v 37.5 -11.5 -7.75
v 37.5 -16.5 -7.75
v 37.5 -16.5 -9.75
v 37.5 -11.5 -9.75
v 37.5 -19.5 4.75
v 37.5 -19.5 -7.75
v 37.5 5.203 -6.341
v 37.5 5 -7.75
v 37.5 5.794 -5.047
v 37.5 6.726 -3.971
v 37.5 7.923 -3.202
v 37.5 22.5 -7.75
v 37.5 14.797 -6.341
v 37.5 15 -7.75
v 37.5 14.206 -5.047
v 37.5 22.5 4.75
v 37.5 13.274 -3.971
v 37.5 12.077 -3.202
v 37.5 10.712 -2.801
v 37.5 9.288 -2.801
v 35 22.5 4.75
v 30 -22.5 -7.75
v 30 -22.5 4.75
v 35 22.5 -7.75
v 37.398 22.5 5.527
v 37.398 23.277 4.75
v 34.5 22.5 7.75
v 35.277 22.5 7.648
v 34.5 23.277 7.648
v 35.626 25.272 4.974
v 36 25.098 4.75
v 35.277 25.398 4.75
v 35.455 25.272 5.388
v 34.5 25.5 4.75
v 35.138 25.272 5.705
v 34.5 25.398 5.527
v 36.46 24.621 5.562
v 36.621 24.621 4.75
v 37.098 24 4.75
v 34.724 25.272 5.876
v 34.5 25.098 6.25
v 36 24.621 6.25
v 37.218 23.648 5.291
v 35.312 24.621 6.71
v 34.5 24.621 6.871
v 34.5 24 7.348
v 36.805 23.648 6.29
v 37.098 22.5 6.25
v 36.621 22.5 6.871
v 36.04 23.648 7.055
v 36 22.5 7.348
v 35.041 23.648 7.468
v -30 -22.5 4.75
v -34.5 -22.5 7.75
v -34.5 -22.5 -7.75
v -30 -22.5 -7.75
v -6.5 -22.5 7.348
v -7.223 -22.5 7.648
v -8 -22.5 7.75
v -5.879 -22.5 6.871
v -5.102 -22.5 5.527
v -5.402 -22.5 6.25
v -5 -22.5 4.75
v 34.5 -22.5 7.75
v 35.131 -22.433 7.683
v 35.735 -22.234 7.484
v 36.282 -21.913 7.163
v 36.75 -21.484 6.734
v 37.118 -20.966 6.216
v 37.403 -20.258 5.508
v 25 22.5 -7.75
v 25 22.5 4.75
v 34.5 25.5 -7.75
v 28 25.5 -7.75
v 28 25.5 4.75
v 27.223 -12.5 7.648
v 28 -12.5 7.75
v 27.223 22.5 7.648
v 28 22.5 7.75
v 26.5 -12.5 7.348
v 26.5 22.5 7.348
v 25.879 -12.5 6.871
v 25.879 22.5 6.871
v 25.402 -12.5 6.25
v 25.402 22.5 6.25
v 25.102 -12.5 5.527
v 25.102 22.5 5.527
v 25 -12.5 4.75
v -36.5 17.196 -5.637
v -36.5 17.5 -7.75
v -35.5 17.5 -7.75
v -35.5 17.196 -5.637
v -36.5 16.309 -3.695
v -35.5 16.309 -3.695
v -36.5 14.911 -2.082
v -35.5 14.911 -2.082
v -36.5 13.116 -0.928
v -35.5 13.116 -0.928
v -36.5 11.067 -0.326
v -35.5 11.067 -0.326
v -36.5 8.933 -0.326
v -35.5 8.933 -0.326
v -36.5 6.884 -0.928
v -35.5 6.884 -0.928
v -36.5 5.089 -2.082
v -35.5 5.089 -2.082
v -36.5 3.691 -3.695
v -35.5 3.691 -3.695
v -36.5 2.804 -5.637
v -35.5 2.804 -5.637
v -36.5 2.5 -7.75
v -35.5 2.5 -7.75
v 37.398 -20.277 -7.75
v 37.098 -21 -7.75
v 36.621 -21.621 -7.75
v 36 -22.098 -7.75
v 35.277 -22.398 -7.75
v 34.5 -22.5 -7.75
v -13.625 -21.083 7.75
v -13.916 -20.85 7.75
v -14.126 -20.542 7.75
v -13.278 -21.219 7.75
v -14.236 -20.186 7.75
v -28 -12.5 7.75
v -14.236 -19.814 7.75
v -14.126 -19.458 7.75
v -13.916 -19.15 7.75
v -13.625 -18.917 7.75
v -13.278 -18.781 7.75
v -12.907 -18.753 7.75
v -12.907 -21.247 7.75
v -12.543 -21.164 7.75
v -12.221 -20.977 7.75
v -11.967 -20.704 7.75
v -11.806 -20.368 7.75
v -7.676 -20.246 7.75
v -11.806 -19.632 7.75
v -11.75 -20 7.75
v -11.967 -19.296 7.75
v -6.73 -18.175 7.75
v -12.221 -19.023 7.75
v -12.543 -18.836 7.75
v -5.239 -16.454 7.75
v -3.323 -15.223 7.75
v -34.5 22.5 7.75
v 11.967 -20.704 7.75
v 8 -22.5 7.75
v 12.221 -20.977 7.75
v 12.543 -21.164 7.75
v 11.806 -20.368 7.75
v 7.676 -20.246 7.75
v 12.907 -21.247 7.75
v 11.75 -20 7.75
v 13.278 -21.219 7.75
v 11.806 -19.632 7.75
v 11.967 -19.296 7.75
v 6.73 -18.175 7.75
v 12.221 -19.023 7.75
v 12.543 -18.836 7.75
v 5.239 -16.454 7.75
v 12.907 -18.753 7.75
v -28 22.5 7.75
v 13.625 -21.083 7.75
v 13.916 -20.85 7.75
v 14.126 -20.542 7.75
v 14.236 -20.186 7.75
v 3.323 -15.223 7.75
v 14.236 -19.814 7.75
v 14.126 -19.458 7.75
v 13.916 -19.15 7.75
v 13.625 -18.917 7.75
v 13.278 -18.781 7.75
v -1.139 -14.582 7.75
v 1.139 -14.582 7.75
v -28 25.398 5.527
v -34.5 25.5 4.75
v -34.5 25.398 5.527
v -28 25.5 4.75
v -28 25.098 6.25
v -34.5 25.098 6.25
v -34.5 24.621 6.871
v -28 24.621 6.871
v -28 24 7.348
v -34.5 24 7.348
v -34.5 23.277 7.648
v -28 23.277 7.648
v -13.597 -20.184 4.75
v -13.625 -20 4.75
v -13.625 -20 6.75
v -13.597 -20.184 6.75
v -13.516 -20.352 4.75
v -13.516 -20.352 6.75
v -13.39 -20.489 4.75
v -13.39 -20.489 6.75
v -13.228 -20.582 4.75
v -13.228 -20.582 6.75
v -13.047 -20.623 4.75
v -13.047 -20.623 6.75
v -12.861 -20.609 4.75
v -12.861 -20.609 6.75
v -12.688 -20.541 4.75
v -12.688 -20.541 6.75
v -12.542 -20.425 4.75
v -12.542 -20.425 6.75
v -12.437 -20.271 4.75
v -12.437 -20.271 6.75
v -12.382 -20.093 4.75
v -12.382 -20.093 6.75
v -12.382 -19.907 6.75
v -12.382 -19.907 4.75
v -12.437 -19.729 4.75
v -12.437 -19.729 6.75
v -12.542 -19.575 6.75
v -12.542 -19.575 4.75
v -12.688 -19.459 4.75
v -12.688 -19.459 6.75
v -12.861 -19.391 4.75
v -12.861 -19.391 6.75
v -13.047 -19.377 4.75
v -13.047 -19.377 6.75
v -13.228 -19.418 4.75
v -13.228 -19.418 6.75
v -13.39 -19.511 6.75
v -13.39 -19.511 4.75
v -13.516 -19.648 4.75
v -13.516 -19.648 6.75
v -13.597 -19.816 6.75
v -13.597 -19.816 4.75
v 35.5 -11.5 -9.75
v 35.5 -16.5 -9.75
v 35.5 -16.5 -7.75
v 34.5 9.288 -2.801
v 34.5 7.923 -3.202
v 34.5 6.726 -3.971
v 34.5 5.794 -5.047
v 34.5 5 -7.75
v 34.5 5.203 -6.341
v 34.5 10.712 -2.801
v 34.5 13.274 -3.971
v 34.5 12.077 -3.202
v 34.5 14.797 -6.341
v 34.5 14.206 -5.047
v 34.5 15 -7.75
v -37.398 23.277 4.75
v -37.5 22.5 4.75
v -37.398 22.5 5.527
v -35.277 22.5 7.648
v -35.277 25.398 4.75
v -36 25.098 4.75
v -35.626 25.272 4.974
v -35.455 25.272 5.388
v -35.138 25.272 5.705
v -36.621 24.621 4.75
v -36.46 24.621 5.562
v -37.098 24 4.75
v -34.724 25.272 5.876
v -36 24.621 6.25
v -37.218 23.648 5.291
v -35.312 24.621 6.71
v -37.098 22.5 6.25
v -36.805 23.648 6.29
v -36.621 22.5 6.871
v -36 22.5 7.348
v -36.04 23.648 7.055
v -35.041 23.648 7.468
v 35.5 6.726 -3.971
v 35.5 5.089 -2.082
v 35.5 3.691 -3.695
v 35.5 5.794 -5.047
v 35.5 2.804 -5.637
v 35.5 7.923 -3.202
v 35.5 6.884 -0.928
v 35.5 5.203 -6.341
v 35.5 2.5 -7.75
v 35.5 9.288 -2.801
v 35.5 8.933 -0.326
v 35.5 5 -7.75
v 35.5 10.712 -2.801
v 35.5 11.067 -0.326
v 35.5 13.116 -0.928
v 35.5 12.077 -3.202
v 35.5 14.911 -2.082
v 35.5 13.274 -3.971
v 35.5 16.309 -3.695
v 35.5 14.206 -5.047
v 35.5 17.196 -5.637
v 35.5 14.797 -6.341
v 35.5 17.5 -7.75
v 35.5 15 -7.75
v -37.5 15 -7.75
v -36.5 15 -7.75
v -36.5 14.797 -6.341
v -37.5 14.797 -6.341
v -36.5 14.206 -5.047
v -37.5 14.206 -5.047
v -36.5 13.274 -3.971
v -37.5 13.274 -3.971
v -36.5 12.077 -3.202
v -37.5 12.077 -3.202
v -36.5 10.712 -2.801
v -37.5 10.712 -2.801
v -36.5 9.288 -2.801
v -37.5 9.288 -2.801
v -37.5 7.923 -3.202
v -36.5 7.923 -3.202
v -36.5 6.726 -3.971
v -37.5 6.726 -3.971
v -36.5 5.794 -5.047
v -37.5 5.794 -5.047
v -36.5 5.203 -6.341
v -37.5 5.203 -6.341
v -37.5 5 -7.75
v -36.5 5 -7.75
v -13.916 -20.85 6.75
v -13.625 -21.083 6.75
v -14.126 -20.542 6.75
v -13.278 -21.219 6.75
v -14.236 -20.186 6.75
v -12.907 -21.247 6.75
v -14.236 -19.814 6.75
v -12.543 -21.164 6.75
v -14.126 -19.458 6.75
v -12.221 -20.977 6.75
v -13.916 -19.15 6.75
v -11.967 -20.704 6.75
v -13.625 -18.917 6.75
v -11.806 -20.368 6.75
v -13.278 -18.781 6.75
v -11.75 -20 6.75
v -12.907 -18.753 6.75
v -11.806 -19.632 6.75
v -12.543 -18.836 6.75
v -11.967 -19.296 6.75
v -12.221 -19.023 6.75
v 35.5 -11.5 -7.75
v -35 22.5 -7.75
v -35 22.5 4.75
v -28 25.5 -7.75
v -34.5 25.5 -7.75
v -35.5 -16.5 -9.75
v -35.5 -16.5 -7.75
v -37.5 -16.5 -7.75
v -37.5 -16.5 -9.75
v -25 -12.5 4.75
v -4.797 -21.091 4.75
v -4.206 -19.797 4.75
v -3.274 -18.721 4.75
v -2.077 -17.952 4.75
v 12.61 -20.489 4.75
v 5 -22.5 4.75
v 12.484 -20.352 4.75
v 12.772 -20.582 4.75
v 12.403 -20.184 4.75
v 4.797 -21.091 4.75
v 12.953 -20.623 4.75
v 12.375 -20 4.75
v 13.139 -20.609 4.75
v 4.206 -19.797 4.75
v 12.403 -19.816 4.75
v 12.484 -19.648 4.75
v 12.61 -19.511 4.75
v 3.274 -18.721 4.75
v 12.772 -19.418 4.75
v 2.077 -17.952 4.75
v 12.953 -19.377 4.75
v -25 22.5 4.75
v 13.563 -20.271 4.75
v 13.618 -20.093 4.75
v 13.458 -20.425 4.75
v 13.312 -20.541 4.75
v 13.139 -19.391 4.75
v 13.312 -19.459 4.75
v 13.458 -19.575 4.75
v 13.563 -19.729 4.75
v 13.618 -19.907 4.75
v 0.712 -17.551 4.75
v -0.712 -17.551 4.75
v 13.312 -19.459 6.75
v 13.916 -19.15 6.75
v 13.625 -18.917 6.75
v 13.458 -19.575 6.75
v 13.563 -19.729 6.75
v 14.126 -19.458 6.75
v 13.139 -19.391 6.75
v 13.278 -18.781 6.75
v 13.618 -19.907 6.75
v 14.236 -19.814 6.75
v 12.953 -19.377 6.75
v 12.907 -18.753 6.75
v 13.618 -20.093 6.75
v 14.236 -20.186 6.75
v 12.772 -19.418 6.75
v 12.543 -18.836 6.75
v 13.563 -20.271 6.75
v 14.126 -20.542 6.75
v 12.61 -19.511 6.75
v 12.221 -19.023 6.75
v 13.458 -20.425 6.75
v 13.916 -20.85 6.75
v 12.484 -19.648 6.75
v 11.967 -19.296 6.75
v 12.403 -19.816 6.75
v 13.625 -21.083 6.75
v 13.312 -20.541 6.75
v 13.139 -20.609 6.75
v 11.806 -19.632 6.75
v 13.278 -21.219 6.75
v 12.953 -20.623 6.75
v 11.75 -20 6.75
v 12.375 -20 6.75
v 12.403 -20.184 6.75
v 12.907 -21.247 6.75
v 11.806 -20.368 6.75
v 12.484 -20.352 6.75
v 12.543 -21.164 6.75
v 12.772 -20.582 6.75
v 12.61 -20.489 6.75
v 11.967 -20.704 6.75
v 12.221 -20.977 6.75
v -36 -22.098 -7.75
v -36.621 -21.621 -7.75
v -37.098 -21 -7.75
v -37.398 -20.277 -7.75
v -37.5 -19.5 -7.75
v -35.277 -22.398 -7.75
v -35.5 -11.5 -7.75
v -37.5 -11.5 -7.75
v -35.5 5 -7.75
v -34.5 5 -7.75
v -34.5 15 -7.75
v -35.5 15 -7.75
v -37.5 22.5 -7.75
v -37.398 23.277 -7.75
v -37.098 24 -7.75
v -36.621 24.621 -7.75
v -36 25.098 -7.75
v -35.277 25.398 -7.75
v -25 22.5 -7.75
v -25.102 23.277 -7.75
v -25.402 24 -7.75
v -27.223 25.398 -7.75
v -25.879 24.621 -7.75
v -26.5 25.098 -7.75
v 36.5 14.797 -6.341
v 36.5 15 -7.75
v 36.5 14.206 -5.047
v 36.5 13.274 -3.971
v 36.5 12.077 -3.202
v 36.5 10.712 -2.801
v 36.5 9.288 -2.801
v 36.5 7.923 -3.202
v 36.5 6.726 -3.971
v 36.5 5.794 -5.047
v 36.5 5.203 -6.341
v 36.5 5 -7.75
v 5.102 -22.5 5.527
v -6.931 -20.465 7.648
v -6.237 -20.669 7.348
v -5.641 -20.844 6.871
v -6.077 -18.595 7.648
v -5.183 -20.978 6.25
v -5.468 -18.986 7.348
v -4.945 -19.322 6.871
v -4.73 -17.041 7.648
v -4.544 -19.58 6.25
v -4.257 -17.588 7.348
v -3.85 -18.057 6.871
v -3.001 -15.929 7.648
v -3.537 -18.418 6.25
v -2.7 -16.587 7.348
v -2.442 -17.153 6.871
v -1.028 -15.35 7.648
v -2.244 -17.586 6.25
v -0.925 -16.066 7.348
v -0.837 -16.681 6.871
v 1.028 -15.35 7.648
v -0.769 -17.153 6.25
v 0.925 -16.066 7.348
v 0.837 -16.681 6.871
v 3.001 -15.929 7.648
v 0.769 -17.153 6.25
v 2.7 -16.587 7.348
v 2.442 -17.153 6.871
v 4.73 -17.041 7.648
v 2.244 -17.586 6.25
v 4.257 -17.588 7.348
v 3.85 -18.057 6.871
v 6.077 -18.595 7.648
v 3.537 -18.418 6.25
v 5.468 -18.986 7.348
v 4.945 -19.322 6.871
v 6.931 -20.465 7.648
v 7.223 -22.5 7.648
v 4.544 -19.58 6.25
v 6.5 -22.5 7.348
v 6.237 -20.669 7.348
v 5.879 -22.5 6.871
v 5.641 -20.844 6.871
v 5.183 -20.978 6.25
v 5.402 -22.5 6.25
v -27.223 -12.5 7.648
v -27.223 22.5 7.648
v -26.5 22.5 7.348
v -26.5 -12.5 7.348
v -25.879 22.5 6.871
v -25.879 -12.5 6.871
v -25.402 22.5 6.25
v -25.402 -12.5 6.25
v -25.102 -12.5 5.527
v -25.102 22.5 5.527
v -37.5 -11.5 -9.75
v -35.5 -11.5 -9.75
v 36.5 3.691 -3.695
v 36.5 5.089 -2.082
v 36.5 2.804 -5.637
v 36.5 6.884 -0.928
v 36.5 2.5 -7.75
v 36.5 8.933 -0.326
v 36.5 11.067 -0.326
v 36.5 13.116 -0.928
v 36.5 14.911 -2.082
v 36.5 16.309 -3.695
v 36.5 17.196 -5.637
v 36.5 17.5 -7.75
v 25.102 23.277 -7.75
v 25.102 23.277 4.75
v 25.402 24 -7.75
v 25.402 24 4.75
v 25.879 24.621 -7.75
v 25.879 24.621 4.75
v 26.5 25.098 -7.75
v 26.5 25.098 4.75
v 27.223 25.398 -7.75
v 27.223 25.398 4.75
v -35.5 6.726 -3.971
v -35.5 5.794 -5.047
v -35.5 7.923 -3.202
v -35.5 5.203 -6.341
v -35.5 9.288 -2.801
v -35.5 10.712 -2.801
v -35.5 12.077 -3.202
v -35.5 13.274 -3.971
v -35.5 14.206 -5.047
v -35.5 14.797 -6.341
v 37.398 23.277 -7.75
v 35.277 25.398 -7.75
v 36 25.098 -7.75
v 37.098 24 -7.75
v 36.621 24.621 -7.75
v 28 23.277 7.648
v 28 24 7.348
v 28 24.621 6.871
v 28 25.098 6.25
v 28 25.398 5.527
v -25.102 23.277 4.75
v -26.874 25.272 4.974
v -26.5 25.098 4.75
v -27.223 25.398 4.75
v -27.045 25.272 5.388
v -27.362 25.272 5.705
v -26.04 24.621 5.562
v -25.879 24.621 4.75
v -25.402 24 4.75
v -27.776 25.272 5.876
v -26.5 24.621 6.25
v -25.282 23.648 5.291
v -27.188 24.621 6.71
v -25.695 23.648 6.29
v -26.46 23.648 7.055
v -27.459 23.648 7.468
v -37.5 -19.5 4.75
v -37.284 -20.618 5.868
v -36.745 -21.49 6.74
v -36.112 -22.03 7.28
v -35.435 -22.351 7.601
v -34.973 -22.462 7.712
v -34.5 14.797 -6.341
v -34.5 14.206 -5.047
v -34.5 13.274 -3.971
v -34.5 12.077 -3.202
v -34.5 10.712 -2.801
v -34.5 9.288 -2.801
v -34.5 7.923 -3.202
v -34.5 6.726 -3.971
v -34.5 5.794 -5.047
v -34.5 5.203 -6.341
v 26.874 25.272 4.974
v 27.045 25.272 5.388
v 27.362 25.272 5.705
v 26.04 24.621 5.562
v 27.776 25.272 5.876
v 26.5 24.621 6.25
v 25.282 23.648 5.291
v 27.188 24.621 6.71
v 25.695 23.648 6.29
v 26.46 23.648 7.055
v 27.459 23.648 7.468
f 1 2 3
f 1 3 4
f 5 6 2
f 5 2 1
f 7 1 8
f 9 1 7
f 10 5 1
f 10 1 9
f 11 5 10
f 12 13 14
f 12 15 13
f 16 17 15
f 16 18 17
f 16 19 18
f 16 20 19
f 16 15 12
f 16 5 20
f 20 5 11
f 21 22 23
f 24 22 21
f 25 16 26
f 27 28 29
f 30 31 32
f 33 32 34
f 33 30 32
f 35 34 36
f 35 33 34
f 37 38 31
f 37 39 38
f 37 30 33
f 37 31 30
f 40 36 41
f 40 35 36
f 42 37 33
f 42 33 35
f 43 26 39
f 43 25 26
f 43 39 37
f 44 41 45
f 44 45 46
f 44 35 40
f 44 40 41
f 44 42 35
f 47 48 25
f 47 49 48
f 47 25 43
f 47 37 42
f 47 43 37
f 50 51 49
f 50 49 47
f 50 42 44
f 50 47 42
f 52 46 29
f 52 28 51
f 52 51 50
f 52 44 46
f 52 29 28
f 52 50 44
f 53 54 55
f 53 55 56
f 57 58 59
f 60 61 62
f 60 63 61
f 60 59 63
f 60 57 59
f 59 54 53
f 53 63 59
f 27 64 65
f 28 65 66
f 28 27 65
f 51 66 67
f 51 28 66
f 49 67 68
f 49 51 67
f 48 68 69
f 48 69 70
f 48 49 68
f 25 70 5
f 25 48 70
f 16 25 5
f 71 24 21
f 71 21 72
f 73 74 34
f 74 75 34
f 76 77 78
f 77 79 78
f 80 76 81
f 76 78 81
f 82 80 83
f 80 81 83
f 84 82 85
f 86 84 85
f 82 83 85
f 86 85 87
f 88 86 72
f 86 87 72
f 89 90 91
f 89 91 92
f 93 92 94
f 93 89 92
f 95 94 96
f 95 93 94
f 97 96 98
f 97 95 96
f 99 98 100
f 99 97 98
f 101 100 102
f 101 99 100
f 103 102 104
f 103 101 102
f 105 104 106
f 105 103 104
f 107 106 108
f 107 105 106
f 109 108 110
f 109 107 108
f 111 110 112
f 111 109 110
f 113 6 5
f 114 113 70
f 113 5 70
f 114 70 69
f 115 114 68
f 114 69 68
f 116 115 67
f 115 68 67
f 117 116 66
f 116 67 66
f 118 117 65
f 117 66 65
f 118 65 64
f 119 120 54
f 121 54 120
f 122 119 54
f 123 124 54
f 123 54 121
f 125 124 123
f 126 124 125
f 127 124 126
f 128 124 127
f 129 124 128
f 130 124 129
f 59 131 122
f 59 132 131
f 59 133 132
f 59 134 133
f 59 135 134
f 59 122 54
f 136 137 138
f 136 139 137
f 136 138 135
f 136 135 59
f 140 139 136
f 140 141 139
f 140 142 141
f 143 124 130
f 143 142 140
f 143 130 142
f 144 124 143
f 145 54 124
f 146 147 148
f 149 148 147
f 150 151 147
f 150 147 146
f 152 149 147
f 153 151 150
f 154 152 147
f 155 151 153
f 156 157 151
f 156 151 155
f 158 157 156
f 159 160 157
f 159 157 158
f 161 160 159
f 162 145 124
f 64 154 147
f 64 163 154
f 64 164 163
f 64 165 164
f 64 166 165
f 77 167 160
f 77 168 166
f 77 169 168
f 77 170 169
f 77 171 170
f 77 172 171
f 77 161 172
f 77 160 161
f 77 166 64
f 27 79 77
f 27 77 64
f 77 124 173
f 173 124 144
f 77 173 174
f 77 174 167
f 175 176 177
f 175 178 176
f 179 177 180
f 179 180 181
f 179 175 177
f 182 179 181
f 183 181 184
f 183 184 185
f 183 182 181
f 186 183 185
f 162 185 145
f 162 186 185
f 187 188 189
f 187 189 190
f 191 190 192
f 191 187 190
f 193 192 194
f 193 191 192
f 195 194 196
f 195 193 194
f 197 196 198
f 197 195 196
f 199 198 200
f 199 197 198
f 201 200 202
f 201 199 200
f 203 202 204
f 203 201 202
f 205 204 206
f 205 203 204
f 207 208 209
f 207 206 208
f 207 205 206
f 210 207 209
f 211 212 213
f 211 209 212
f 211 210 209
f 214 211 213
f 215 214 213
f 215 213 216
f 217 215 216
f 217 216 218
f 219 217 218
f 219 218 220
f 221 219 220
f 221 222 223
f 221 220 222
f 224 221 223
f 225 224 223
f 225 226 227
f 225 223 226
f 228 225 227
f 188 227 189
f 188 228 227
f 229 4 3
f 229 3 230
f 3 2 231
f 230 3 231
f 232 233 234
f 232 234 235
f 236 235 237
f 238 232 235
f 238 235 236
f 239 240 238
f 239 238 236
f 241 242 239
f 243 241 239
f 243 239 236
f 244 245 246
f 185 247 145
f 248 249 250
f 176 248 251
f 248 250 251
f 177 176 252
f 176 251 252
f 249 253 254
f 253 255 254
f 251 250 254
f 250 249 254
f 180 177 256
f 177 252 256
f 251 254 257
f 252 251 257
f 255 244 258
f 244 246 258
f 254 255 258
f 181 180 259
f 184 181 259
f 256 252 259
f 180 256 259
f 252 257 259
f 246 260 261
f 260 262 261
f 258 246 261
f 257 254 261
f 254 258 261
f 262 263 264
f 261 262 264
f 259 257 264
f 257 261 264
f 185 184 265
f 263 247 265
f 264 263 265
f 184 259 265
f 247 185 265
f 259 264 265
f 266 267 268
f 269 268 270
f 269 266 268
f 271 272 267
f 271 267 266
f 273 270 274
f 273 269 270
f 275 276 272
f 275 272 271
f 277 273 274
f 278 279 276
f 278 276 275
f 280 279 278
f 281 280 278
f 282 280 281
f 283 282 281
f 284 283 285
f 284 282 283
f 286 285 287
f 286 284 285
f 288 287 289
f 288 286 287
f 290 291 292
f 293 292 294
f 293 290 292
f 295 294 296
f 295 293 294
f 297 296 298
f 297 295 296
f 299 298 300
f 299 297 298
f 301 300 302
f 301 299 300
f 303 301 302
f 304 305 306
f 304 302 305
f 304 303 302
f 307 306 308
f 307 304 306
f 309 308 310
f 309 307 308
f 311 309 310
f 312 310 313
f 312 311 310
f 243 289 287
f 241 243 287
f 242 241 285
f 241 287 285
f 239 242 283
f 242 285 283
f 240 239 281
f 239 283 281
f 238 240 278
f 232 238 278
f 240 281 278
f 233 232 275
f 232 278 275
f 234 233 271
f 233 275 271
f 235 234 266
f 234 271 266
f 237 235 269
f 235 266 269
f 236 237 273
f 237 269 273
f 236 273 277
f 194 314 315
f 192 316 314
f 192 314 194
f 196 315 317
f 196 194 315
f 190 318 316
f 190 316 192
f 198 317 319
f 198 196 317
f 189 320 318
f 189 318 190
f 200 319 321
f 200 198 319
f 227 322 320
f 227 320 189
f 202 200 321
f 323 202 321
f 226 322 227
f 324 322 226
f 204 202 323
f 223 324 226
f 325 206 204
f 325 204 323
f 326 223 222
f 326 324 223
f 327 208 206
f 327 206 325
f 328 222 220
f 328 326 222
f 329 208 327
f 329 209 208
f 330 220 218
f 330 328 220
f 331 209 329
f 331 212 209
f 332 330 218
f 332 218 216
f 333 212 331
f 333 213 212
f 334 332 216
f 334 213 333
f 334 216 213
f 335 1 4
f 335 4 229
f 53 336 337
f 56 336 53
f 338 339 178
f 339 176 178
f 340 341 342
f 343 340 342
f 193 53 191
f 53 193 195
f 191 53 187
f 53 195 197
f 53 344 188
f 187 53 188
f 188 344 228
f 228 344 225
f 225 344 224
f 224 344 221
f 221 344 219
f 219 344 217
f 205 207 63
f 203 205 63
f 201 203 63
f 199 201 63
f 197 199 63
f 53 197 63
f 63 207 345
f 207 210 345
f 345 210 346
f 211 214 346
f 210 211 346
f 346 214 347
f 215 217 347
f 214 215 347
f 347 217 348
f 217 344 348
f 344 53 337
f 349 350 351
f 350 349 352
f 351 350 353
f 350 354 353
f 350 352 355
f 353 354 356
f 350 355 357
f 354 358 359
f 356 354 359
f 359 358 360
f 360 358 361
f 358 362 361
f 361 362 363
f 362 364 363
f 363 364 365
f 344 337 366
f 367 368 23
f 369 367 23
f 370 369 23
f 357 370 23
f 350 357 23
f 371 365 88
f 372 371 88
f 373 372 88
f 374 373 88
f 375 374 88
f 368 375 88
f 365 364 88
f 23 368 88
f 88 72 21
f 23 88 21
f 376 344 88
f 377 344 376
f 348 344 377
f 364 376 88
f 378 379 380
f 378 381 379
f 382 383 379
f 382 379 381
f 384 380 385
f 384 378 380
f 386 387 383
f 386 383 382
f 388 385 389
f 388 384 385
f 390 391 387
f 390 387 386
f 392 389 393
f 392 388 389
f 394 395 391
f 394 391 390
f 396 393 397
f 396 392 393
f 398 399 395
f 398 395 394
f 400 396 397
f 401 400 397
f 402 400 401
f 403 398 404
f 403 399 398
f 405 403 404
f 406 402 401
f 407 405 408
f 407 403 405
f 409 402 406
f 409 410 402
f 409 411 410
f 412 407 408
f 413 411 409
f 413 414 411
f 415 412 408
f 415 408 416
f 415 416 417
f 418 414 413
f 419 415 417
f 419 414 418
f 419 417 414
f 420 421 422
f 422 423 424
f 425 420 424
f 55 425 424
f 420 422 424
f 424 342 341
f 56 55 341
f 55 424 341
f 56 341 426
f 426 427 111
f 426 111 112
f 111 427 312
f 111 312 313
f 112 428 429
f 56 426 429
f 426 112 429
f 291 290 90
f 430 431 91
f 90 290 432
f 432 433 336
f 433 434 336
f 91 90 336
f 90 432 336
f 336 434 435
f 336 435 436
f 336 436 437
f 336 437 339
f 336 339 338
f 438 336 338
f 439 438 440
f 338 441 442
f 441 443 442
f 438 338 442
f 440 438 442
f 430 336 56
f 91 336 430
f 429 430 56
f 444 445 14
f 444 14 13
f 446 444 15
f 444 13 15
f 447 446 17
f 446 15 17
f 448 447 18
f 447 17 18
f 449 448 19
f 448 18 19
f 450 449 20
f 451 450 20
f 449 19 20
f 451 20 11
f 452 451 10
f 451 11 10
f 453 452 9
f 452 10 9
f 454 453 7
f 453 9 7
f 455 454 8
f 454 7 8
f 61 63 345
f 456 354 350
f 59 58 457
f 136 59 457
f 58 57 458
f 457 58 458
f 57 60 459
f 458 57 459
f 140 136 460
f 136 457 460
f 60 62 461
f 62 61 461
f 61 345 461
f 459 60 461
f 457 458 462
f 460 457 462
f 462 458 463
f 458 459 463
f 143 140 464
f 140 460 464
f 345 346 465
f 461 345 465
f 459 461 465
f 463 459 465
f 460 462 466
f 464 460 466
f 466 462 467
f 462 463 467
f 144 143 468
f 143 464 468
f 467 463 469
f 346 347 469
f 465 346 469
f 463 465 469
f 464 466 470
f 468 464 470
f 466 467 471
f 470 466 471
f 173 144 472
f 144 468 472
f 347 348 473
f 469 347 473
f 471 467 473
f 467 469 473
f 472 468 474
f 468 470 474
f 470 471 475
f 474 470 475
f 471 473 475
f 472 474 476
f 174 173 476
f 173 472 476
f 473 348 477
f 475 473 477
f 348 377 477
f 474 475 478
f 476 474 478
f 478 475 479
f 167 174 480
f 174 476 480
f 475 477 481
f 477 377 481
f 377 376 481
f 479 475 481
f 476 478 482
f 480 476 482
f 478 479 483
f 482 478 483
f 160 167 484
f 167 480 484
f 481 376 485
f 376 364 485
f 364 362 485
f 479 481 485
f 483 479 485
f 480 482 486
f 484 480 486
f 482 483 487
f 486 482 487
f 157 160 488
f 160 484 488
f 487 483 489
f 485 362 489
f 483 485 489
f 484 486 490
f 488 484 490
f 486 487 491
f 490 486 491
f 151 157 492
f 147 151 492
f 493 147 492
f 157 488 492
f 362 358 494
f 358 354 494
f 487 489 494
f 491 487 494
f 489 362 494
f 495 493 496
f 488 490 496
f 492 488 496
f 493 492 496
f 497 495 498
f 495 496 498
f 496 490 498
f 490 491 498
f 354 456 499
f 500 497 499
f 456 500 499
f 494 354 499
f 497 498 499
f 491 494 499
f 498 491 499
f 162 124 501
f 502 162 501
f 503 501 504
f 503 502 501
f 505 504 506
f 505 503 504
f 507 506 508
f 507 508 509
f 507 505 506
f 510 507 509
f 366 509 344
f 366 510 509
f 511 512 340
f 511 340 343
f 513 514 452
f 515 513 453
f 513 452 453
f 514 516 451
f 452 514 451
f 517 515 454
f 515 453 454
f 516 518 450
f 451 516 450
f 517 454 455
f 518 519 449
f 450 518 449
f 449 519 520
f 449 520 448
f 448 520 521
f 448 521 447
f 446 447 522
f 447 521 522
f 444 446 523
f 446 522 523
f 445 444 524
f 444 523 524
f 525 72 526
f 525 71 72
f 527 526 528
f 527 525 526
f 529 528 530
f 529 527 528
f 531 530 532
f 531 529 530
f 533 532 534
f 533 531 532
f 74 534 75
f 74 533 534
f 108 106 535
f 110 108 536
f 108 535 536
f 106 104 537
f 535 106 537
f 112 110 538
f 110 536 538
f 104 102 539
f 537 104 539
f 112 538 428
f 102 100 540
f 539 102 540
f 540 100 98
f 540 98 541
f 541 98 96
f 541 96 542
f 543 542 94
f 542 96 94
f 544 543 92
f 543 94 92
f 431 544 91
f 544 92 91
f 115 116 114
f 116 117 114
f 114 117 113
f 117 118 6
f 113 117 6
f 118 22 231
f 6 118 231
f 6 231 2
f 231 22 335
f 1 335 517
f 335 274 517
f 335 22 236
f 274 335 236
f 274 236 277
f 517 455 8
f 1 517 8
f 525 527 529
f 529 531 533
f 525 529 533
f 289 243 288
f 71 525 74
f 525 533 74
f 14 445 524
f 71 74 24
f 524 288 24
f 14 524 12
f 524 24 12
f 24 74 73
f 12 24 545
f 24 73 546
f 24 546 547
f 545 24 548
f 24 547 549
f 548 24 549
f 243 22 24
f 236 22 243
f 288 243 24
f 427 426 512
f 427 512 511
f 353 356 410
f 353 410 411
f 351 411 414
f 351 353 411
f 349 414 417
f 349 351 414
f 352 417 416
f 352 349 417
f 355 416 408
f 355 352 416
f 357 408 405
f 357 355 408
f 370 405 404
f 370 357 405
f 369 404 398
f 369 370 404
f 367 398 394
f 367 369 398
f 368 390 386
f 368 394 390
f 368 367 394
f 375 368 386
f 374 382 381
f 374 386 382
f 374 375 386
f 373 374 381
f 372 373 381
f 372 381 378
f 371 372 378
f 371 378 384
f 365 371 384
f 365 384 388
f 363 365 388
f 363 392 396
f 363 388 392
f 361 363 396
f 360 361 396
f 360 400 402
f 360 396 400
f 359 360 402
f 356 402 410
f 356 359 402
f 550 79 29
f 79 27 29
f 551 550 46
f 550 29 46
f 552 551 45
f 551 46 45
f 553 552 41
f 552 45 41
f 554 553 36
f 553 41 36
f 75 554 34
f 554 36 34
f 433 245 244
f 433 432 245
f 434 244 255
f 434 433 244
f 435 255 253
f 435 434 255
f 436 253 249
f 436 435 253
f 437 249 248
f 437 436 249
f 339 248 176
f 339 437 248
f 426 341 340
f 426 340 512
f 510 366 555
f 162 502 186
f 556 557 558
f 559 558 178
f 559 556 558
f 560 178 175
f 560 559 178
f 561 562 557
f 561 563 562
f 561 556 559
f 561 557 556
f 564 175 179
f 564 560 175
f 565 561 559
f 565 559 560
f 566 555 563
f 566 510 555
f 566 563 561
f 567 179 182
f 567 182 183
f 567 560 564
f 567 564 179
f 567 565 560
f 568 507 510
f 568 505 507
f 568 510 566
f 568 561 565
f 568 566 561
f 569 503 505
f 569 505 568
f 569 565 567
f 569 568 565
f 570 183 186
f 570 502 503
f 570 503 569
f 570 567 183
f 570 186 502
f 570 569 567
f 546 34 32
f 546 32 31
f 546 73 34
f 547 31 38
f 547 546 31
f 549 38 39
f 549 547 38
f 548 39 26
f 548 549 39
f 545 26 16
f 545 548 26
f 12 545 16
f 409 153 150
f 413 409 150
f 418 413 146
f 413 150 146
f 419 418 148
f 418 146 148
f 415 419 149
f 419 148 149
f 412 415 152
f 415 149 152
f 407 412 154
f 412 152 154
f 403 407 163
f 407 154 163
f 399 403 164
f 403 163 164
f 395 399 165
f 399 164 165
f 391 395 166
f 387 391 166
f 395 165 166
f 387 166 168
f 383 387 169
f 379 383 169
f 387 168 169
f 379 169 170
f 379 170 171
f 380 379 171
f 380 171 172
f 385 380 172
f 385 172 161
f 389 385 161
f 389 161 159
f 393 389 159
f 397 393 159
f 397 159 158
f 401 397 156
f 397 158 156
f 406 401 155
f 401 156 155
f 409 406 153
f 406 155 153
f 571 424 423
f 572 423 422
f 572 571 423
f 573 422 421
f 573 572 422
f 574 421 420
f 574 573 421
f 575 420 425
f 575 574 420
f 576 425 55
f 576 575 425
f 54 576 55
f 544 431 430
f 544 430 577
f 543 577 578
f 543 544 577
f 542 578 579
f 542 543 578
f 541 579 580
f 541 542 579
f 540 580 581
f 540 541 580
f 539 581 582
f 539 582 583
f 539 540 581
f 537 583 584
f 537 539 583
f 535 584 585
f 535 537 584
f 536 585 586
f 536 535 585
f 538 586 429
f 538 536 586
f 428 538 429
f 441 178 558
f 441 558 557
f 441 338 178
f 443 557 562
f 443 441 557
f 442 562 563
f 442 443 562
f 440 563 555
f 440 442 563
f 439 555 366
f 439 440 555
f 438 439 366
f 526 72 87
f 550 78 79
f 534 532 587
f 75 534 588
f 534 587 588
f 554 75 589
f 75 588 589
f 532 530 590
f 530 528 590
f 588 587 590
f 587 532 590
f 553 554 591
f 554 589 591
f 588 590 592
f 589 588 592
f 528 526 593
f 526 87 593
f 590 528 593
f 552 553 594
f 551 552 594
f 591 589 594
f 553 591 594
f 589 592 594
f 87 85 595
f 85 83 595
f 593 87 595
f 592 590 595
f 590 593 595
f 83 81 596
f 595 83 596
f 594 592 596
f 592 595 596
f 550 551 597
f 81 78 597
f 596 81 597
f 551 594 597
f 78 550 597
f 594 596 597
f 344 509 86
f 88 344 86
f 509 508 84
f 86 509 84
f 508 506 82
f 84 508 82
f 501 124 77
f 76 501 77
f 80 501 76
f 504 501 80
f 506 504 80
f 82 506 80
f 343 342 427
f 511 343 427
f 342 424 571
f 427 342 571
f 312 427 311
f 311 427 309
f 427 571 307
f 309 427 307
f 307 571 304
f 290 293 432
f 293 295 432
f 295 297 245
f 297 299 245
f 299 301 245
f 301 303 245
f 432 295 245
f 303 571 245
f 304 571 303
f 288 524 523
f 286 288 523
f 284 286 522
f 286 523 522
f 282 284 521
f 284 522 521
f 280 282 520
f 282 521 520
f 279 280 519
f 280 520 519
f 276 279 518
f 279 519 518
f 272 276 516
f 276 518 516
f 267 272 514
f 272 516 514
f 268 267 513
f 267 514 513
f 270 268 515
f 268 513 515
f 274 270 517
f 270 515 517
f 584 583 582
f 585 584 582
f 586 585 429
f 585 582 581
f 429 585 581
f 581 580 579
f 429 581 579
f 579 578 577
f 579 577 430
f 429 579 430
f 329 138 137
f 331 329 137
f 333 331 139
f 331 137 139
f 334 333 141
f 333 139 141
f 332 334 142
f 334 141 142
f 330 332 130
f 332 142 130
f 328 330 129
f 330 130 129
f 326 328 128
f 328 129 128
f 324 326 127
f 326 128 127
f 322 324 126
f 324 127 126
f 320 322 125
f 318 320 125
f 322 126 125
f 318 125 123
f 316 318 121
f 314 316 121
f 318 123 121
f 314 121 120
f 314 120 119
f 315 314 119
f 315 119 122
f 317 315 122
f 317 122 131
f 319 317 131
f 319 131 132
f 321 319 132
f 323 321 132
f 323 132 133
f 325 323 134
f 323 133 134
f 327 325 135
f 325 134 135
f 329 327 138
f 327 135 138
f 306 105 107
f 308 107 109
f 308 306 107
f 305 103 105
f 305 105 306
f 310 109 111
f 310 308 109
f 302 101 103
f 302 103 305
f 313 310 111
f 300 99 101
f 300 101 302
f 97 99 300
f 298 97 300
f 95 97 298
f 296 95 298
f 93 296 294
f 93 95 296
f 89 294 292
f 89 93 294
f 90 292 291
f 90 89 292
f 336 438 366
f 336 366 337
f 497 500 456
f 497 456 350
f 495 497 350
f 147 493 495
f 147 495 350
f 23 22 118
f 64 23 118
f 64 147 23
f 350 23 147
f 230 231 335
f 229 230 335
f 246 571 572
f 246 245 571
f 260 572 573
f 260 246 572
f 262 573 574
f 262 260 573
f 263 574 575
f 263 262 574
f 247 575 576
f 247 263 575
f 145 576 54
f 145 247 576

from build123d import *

# Parameters (mm, degrees)
SKETCH2_W           = 75
SKETCH2_H           = 48
BOSS_EXTRUDE1_DEPTH = 7.75
CUT_EXTRUDE4_DEPTH  = 12.5
SKETCH12_W          = 50
SKETCH12_H          = 38
CUT_EXTRUDE5_DEPTH  = 7.75
SKETCH13_R          = 0.625
CUT_EXTRUDE6_DEPTH  = 47.006113724
FILLET4_R           = 3
SKETCH14_W          = 2
SKETCH14_H          = 5
BOSS_EXTRUDE2_DEPTH = 2
SKETCH16_R          = 1.25
CUT_EXTRUDE9_DEPTH  = 1
SKETCH18_R          = 5
CUT_EXTRUDE10_DEPTH = 3
SKETCH19_R          = 7.5
CUT_EXTRUDE11_DEPTH = 0.5


with BuildPart() as part:
    # Sketch2 → Boss-Extrude1 (new, symmetric)
    with BuildSketch(Plane.XY):
        with Locations((0, 1.5)):
            Rectangle(SKETCH2_W, SKETCH2_H)
    extrude(amount=BOSS_EXTRUDE1_DEPTH, both=True)

    # Sketch11 → Cut-Extrude4 (cut)
    with BuildSketch(Plane(origin=(0, 0, -7.75), x_dir=(-1, 0, 0), z_dir=(0, 0, -1))):
        Polygon((-35, 22.5), (35, 22.5), (30, -22.5), (-30, -22.5), align=None)
    extrude(amount=-CUT_EXTRUDE4_DEPTH, mode=Mode.SUBTRACT)

    # Sketch12 → Cut-Extrude5 (cut, symmetric)
    with BuildSketch(Plane.XY):
        with Locations((0, 6.5)):
            Rectangle(SKETCH12_W, SKETCH12_H)
    extrude(amount=CUT_EXTRUDE5_DEPTH, both=True, mode=Mode.SUBTRACT)

    # Sketch13 → Cut-Extrude6 (cut, through all)
    with BuildSketch(Plane.XY):
        with Locations(Location((13, -20, 0), (0, 0, 180))):
            Circle(SKETCH13_R)
        with Locations(Location((-13, -20, 0), (0, 0, 180))):
            Circle(SKETCH13_R)
        with BuildLine():
            Line((-5, -22.5), (5, -22.5))
            ThreePointArc((5, -22.5), (0, -17.5), (-5, -22.5))
        make_face()
    extrude(amount=CUT_EXTRUDE6_DEPTH, mode=Mode.SUBTRACT)

    # Fillet4
    fillet4_edges = [part.edges().sort_by_distance(p)[0] for p in [
        (0, -17.5, 7.75),
        (37.5, 1.5, 7.75),
        (25, 6.5, 7.75),
        (-25, 6.5, 7.75),
        (-37.5, 1.5, 7.75),
        (25, 25.5, 0),
        (-25, 25.5, 0),
        (-37.5, 25.5, 0),
        (37.5, 25.5, 0),
        (31.25, 25.5, 7.75),
        (-31.25, 25.5, 7.75),
        (-37.5, -22.5, 0),
        (37.5, -22.5, 0),
    ]]
    fillet(fillet4_edges, radius=FILLET4_R - 0.0001)  # a hair under: the kernel refuses the full size

    # Sketch14 → Boss-Extrude2 (add)
    with BuildSketch(Plane(origin=(0, 0, -7.75), x_dir=(-1, 0, 0), z_dir=(0, 0, -1))):
        with Locations((-36.5, -14)):
            Rectangle(SKETCH14_W, SKETCH14_H)
        with Locations((36.5, -14)):
            Rectangle(SKETCH14_W, SKETCH14_H)
    extrude(amount=BOSS_EXTRUDE2_DEPTH)

    # Sketch16 → Cut-Extrude9 (cut)
    with BuildSketch(Plane.XY.offset(7.75)):
        with Locations((-13, -20)):
            Circle(SKETCH16_R)
        with Locations(Location((13, -20, 0), (0, 0, 180))):
            Circle(SKETCH16_R)
    extrude(amount=-CUT_EXTRUDE9_DEPTH, mode=Mode.SUBTRACT)

    # Sketch18 → Cut-Extrude10 (cut)
    with BuildSketch(Plane(origin=(37.5, 0, 0), x_dir=(0, 0, -1), z_dir=(1, 0, 0))):
        with Locations((7.75, 10)):
            Circle(SKETCH18_R)
    cut_extrude10 = extrude(amount=-CUT_EXTRUDE10_DEPTH, mode=Mode.SUBTRACT)

    # Sketch19 → Cut-Extrude11 (cut, symmetric)
    with BuildSketch(Plane(origin=(36, 0, 0), x_dir=(0, 0, -1), z_dir=(1, 0, 0))):
        with Locations((7.75, 10)):
            Circle(SKETCH19_R)
    cut_extrude11 = extrude(amount=CUT_EXTRUDE11_DEPTH, both=True, mode=Mode.SUBTRACT)

    # Mirror1: Cut-Extrude10, Cut-Extrude11 across plane
    add(cut_extrude10.mirror(Plane(origin=(0, 0, 0), x_dir=(0, 0, 1), z_dir=(1, 0, 0))), mode=Mode.SUBTRACT)
    add(cut_extrude11.mirror(Plane(origin=(0, 0, 0), x_dir=(0, 0, 1), z_dir=(1, 0, 0))), mode=Mode.SUBTRACT)


solid = part.part
